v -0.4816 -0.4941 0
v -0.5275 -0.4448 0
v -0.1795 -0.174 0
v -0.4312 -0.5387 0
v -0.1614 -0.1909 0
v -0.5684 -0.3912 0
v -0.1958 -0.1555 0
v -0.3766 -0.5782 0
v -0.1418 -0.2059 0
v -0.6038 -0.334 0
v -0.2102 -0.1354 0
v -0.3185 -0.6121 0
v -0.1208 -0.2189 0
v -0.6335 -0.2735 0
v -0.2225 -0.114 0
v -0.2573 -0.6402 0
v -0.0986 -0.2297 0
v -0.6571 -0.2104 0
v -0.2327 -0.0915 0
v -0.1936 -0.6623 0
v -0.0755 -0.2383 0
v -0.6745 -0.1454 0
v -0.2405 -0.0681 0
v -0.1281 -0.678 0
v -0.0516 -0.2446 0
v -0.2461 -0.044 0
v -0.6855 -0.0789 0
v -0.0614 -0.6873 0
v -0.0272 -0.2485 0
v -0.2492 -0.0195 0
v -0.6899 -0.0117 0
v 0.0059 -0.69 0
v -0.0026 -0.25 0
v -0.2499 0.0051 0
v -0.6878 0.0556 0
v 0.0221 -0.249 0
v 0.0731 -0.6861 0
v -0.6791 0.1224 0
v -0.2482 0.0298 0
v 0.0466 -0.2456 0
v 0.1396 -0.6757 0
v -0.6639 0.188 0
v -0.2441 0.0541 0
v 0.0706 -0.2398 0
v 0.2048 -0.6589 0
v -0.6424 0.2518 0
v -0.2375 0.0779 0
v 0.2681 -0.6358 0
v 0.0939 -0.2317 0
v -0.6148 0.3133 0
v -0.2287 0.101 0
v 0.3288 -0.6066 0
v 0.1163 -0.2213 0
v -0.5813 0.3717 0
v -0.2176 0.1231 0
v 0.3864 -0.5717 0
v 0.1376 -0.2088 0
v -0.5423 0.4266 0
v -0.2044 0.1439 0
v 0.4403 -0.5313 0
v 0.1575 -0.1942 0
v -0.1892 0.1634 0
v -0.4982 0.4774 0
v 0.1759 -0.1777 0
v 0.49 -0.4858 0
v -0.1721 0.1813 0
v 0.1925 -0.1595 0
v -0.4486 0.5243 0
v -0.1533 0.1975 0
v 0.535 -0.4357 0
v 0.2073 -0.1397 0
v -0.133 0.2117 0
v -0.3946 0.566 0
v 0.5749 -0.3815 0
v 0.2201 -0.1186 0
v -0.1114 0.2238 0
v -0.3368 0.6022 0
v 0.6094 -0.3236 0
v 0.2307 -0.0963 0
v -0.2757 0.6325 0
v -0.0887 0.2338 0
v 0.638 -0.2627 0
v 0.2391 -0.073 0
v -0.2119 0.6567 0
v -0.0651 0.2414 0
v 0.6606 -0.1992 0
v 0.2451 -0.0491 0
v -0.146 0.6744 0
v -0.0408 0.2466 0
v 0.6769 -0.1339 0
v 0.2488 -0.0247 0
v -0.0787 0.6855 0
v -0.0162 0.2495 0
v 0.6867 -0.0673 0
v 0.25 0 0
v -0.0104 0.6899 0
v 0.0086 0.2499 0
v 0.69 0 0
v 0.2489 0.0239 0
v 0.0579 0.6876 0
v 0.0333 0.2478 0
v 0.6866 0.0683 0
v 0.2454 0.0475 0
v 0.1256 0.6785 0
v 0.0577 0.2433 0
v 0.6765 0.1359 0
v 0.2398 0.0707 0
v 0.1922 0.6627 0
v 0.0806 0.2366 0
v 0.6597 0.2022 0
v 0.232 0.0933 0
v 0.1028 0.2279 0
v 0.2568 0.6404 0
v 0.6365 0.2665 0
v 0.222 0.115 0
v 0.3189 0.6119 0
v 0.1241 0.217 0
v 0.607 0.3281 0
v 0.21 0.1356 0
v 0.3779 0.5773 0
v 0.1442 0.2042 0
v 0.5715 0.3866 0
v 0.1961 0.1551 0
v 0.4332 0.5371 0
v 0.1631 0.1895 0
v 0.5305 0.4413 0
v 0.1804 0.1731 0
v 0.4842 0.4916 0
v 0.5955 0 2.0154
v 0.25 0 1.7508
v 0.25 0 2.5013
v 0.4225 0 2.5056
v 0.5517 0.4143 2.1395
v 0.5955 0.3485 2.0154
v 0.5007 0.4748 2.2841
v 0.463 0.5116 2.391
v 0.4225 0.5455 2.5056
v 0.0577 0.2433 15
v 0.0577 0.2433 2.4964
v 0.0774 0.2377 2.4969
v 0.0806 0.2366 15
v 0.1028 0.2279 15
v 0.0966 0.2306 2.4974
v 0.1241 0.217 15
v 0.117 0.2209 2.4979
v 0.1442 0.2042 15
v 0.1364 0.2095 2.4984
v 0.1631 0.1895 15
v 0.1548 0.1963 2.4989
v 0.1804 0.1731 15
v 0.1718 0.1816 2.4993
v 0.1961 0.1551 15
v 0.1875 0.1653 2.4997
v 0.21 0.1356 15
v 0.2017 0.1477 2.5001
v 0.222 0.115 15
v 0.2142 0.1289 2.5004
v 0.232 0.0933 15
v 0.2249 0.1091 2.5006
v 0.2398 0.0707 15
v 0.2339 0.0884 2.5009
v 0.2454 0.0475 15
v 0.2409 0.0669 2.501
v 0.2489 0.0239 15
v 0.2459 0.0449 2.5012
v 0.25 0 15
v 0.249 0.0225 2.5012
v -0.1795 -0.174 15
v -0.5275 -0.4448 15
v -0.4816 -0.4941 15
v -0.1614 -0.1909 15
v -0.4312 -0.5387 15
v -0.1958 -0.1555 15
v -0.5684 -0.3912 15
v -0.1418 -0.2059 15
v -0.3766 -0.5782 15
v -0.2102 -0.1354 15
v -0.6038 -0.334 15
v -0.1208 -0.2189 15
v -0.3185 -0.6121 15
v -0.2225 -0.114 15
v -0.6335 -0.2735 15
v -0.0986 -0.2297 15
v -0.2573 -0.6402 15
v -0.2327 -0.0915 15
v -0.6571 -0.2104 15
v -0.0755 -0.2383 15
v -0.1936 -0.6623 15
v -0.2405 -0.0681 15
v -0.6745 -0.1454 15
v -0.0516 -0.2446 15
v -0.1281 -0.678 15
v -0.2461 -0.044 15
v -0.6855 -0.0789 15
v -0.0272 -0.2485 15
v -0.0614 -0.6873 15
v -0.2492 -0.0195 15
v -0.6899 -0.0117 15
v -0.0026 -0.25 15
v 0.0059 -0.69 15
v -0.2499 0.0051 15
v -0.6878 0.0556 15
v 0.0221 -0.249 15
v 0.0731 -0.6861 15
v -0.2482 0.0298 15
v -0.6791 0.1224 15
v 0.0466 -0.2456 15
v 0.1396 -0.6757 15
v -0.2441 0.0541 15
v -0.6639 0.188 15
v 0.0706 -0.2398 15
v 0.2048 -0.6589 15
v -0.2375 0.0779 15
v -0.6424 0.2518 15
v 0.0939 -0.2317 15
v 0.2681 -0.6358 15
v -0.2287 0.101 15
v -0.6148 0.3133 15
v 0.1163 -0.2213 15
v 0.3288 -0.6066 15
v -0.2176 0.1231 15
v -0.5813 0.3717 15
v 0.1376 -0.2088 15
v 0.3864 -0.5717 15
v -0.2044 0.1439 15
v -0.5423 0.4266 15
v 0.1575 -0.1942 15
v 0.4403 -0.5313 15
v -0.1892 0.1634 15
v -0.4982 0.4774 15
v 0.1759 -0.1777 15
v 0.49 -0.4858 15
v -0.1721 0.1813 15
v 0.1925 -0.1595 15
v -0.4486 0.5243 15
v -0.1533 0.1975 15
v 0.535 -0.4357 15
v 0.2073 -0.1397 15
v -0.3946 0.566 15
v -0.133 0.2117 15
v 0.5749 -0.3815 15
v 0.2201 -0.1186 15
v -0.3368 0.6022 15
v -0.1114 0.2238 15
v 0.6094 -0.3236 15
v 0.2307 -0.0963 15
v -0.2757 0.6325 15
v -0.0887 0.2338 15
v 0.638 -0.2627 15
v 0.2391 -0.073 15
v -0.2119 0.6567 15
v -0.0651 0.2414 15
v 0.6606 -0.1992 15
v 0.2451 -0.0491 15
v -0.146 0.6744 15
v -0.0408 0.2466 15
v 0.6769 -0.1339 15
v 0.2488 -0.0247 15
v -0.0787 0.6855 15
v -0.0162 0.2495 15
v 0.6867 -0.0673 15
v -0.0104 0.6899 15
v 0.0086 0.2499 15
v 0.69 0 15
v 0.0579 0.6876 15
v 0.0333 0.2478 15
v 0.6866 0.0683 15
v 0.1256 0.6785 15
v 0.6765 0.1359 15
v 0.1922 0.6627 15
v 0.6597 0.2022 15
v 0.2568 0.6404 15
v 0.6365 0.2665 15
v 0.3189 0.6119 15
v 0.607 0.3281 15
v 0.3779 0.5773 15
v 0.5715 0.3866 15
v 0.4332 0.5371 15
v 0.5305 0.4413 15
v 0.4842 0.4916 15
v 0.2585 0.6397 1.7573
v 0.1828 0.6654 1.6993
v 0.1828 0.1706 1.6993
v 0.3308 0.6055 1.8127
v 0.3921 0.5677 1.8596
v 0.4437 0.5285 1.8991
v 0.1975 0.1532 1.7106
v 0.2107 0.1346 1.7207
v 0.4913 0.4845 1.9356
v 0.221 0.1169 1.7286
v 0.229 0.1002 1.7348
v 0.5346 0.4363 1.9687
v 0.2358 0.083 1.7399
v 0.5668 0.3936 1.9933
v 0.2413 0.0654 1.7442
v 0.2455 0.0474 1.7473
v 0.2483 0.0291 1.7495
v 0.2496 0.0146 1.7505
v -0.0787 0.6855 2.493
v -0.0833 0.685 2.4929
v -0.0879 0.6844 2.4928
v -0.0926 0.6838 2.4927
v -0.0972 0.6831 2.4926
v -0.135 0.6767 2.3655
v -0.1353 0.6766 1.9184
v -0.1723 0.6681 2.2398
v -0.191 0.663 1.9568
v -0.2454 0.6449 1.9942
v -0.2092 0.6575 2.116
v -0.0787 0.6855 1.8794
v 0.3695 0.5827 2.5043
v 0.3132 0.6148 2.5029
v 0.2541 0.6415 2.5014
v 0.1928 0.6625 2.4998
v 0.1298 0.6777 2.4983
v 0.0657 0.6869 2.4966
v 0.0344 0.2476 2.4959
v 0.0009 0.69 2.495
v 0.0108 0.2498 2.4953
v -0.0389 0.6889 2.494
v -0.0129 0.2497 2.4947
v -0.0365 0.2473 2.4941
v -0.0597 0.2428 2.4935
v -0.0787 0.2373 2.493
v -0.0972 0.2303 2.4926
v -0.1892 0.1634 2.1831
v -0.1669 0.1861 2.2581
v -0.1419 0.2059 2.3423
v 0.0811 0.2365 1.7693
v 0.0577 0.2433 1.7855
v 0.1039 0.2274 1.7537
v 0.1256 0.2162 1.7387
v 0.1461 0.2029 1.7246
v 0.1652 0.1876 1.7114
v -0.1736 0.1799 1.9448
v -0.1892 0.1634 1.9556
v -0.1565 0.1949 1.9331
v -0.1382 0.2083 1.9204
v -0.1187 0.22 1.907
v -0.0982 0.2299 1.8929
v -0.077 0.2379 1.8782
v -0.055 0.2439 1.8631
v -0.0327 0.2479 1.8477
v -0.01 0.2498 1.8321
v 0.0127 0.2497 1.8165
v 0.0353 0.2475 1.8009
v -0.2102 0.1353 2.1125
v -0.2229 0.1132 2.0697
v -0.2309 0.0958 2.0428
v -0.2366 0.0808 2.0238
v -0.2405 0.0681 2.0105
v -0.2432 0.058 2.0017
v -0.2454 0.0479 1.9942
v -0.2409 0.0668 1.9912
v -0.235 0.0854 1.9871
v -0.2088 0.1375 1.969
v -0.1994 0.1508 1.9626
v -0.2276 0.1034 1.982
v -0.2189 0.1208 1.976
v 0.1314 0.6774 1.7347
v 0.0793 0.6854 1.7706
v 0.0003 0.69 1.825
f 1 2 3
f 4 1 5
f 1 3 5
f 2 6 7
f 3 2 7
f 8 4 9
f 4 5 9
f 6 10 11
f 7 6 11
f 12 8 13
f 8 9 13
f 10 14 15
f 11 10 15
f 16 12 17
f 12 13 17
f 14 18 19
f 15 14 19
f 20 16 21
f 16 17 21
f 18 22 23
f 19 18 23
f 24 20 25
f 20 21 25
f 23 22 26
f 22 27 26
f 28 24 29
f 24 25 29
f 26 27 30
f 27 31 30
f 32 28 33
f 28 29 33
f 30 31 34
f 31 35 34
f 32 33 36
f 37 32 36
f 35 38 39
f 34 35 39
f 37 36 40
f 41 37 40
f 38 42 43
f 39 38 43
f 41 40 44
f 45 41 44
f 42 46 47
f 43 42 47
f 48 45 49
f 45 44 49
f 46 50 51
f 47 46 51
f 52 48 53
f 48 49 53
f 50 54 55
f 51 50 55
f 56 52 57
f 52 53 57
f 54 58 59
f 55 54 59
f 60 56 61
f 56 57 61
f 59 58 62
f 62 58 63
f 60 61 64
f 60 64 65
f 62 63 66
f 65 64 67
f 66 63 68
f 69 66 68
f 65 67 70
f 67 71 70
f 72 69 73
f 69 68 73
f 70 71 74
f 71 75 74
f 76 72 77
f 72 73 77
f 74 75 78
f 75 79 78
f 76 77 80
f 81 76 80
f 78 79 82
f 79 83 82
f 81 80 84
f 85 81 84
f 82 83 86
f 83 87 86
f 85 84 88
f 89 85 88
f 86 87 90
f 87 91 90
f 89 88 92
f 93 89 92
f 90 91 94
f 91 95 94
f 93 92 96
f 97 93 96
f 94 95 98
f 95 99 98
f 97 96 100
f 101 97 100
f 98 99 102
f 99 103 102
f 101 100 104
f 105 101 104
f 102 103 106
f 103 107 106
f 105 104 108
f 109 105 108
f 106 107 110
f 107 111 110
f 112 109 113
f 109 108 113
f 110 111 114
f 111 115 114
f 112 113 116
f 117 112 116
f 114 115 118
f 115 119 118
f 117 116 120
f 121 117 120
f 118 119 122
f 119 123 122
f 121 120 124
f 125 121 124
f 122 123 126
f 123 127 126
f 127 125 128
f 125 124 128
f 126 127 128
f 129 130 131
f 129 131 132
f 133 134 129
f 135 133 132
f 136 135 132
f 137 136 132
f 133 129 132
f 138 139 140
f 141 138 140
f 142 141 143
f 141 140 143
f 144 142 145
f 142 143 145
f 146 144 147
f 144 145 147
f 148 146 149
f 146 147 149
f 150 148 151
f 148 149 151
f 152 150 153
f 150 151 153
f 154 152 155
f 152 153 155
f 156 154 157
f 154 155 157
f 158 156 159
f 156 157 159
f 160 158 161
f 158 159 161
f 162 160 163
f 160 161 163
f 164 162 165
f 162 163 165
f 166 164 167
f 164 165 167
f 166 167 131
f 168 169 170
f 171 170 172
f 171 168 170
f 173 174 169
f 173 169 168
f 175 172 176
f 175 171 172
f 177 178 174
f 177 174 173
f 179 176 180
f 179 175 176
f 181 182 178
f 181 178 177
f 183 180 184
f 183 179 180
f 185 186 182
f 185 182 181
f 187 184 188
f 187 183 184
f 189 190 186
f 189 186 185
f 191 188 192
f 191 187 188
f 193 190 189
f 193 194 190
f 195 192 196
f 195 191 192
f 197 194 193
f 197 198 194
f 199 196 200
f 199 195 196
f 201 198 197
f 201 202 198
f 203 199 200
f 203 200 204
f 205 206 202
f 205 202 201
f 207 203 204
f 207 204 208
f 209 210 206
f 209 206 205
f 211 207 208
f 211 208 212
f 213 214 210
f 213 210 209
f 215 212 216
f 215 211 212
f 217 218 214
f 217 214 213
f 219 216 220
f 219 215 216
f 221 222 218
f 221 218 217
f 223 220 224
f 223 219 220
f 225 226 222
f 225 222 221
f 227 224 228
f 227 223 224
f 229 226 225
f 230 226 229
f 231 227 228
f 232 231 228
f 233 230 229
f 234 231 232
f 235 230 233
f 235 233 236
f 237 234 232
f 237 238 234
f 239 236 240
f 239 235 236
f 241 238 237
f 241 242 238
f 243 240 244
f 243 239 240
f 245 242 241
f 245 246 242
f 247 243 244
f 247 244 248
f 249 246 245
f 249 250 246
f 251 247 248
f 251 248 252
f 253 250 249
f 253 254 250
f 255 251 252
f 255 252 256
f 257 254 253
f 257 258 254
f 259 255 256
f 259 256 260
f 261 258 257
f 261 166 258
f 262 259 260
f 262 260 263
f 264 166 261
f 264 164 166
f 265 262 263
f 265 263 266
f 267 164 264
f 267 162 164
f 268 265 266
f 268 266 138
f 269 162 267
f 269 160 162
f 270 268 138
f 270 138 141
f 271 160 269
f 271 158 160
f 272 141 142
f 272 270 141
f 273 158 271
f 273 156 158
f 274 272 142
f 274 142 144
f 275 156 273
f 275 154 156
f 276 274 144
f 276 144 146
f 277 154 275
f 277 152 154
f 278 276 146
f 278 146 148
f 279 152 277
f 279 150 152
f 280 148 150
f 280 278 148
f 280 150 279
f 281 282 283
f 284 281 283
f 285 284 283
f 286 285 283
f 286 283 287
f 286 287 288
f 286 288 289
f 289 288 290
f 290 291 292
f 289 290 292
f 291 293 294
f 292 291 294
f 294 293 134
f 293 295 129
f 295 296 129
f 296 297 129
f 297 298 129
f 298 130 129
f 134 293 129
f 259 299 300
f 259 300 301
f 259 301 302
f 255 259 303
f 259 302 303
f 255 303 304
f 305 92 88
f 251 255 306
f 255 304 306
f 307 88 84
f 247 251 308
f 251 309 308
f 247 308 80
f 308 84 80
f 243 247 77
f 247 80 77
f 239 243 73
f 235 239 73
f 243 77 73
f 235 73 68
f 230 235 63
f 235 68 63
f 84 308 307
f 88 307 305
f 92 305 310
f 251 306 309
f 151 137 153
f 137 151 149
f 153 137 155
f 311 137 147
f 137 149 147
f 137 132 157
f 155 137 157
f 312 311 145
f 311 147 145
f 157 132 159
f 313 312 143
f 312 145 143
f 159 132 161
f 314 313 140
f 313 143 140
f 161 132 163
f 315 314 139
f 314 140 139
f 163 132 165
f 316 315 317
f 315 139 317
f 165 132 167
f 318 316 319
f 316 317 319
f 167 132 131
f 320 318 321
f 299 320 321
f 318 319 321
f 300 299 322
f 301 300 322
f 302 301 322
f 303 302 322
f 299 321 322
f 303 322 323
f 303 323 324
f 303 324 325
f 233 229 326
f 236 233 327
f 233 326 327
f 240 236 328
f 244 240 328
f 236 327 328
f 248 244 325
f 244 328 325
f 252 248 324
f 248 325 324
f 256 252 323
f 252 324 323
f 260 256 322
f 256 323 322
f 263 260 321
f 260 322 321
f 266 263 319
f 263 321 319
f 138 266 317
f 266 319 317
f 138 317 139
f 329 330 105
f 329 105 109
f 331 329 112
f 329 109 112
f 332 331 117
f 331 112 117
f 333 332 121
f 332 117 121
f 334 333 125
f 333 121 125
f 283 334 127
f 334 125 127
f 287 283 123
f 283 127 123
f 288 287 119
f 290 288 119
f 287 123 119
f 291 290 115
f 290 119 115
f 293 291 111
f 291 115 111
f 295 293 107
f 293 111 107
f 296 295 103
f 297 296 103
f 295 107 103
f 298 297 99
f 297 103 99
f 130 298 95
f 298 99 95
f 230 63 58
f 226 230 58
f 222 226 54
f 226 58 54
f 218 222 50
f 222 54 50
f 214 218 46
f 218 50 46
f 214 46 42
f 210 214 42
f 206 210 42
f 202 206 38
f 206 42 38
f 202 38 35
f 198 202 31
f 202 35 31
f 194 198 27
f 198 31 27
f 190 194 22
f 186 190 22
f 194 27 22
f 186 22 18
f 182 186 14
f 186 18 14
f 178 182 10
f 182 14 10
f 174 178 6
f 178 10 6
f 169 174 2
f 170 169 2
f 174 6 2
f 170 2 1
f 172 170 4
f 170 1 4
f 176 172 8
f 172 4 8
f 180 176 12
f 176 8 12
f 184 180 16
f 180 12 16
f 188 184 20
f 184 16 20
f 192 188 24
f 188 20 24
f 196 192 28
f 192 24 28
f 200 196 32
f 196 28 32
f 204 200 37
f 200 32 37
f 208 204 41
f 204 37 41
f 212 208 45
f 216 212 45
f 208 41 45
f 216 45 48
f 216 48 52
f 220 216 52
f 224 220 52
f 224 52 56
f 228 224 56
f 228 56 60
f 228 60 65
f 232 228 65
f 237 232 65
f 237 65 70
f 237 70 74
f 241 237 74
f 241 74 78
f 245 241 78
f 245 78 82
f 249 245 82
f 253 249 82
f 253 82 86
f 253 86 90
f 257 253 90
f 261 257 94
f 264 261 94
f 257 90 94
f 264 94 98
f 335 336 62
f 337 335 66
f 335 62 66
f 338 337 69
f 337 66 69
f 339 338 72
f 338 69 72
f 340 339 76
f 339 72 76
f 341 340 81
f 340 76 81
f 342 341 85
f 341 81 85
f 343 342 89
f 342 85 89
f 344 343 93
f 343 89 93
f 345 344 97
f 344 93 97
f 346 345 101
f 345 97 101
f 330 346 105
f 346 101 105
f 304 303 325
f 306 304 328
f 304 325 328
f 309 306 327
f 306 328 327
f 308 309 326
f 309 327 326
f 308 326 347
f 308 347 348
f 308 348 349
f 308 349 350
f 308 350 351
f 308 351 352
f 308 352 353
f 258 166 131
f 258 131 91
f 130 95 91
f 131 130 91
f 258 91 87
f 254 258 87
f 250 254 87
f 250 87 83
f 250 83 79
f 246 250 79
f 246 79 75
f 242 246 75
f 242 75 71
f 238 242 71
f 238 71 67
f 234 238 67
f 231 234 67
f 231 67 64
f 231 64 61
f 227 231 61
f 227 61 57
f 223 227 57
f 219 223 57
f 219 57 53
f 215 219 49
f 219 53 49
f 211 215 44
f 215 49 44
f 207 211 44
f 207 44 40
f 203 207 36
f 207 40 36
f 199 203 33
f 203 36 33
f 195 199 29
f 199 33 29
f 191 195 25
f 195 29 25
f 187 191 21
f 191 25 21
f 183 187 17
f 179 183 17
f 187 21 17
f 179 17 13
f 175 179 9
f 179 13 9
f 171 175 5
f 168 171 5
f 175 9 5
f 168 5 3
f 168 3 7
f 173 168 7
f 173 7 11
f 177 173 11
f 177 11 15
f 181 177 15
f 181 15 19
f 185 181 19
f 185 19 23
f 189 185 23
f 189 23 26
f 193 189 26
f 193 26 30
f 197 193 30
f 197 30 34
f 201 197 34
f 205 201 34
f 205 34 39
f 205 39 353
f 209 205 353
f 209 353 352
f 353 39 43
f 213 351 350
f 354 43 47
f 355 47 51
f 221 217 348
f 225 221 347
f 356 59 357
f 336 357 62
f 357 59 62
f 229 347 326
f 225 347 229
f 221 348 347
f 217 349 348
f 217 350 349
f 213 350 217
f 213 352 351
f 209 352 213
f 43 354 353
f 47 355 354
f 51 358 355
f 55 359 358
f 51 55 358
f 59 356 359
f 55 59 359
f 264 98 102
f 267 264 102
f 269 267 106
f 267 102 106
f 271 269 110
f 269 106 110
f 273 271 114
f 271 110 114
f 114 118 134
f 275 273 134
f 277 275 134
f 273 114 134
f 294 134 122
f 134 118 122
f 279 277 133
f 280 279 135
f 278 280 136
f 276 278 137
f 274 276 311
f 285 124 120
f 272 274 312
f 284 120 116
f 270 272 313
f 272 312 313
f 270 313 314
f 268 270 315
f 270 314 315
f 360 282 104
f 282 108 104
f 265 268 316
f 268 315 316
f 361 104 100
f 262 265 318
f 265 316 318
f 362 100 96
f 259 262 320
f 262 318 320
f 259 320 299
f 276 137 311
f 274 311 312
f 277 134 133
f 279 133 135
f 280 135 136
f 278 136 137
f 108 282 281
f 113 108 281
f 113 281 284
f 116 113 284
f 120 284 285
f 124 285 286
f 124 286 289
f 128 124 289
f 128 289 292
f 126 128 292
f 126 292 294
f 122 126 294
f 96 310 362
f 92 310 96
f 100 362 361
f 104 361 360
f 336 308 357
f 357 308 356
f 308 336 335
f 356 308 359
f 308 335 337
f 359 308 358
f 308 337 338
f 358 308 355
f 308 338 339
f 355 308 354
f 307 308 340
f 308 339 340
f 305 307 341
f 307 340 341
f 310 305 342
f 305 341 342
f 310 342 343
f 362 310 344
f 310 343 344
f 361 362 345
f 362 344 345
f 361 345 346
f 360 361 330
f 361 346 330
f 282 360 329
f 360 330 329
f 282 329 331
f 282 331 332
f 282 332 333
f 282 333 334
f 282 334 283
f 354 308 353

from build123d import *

# Parameters (mm, degrees)
F1_DEPTH = 15
F3_DEPTH = 0.7


with BuildPart() as f1:
    # F0 (on Top) → F1 (new body)
    with BuildSketch(Plane.XY):
        with BuildLine():
            ThreePointArc((-0.1892170156, 0.1633919246), (-0.0769557602, 0.2378609068), (0.0576512547, 0.2432618606))
            Line((0.0576512547, 0.2432618606), (0.1187294021, 0.5791915106))
            Line((0.1187294021, 0.5791915106), (-0.0786682724, 0.685500768))
            ThreePointArc((-0.0786682724, 0.685500768), (-0.3065994221, 0.6181397855), (-0.4981520055, 0.4774354191))
            Line((-0.4981520055, 0.4774354191), (-0.3374110871, 0.143368077))
            Line((-0.3374110871, 0.143368077), (-0.1892170156, 0.1633919246))
        make_face()
        with BuildLine():
            ThreePointArc((0.0576512547, 0.2432618606), (0.1961030516, 0.1550599663), (0.25, 0))
            ThreePointArc((0.25, 0), (-0.0871657791, -0.234312029), (-0.1892170156, 0.1633919246))
            Line((-0.1892170156, 0.1633919246), (-0.3374110871, 0.143368077))
            Line((-0.3374110871, 0.143368077), (-0.4981520055, 0.4774354191))
            ThreePointArc((-0.4981520055, 0.4774354191), (-0.2572694271, -0.6402440487), (0.69, 0))
            ThreePointArc((0.69, 0), (0.4592487844, 0.5149665562), (-0.0786682724, 0.685500768))
            Line((-0.0786682724, 0.685500768), (0.1187294021, 0.5791915106))
            Line((0.1187294021, 0.5791915106), (0.0576512547, 0.2432618606))
        make_face()
    extrude(amount=F1_DEPTH)

    # F2 (on Front) → F3 (cut)
    with BuildSketch(Plane.XZ):
        Polygon((0.1827530931, 1.6993293346), (0.5955339908, 2.0153646515), (0.4225228556, 2.5056028978), (-0.097184804, 2.4925514797), (-0.2453706668, 1.9942470135), align=None)
    extrude(amount=-F3_DEPTH, mode=Mode.SUBTRACT)


solid = f1.part
